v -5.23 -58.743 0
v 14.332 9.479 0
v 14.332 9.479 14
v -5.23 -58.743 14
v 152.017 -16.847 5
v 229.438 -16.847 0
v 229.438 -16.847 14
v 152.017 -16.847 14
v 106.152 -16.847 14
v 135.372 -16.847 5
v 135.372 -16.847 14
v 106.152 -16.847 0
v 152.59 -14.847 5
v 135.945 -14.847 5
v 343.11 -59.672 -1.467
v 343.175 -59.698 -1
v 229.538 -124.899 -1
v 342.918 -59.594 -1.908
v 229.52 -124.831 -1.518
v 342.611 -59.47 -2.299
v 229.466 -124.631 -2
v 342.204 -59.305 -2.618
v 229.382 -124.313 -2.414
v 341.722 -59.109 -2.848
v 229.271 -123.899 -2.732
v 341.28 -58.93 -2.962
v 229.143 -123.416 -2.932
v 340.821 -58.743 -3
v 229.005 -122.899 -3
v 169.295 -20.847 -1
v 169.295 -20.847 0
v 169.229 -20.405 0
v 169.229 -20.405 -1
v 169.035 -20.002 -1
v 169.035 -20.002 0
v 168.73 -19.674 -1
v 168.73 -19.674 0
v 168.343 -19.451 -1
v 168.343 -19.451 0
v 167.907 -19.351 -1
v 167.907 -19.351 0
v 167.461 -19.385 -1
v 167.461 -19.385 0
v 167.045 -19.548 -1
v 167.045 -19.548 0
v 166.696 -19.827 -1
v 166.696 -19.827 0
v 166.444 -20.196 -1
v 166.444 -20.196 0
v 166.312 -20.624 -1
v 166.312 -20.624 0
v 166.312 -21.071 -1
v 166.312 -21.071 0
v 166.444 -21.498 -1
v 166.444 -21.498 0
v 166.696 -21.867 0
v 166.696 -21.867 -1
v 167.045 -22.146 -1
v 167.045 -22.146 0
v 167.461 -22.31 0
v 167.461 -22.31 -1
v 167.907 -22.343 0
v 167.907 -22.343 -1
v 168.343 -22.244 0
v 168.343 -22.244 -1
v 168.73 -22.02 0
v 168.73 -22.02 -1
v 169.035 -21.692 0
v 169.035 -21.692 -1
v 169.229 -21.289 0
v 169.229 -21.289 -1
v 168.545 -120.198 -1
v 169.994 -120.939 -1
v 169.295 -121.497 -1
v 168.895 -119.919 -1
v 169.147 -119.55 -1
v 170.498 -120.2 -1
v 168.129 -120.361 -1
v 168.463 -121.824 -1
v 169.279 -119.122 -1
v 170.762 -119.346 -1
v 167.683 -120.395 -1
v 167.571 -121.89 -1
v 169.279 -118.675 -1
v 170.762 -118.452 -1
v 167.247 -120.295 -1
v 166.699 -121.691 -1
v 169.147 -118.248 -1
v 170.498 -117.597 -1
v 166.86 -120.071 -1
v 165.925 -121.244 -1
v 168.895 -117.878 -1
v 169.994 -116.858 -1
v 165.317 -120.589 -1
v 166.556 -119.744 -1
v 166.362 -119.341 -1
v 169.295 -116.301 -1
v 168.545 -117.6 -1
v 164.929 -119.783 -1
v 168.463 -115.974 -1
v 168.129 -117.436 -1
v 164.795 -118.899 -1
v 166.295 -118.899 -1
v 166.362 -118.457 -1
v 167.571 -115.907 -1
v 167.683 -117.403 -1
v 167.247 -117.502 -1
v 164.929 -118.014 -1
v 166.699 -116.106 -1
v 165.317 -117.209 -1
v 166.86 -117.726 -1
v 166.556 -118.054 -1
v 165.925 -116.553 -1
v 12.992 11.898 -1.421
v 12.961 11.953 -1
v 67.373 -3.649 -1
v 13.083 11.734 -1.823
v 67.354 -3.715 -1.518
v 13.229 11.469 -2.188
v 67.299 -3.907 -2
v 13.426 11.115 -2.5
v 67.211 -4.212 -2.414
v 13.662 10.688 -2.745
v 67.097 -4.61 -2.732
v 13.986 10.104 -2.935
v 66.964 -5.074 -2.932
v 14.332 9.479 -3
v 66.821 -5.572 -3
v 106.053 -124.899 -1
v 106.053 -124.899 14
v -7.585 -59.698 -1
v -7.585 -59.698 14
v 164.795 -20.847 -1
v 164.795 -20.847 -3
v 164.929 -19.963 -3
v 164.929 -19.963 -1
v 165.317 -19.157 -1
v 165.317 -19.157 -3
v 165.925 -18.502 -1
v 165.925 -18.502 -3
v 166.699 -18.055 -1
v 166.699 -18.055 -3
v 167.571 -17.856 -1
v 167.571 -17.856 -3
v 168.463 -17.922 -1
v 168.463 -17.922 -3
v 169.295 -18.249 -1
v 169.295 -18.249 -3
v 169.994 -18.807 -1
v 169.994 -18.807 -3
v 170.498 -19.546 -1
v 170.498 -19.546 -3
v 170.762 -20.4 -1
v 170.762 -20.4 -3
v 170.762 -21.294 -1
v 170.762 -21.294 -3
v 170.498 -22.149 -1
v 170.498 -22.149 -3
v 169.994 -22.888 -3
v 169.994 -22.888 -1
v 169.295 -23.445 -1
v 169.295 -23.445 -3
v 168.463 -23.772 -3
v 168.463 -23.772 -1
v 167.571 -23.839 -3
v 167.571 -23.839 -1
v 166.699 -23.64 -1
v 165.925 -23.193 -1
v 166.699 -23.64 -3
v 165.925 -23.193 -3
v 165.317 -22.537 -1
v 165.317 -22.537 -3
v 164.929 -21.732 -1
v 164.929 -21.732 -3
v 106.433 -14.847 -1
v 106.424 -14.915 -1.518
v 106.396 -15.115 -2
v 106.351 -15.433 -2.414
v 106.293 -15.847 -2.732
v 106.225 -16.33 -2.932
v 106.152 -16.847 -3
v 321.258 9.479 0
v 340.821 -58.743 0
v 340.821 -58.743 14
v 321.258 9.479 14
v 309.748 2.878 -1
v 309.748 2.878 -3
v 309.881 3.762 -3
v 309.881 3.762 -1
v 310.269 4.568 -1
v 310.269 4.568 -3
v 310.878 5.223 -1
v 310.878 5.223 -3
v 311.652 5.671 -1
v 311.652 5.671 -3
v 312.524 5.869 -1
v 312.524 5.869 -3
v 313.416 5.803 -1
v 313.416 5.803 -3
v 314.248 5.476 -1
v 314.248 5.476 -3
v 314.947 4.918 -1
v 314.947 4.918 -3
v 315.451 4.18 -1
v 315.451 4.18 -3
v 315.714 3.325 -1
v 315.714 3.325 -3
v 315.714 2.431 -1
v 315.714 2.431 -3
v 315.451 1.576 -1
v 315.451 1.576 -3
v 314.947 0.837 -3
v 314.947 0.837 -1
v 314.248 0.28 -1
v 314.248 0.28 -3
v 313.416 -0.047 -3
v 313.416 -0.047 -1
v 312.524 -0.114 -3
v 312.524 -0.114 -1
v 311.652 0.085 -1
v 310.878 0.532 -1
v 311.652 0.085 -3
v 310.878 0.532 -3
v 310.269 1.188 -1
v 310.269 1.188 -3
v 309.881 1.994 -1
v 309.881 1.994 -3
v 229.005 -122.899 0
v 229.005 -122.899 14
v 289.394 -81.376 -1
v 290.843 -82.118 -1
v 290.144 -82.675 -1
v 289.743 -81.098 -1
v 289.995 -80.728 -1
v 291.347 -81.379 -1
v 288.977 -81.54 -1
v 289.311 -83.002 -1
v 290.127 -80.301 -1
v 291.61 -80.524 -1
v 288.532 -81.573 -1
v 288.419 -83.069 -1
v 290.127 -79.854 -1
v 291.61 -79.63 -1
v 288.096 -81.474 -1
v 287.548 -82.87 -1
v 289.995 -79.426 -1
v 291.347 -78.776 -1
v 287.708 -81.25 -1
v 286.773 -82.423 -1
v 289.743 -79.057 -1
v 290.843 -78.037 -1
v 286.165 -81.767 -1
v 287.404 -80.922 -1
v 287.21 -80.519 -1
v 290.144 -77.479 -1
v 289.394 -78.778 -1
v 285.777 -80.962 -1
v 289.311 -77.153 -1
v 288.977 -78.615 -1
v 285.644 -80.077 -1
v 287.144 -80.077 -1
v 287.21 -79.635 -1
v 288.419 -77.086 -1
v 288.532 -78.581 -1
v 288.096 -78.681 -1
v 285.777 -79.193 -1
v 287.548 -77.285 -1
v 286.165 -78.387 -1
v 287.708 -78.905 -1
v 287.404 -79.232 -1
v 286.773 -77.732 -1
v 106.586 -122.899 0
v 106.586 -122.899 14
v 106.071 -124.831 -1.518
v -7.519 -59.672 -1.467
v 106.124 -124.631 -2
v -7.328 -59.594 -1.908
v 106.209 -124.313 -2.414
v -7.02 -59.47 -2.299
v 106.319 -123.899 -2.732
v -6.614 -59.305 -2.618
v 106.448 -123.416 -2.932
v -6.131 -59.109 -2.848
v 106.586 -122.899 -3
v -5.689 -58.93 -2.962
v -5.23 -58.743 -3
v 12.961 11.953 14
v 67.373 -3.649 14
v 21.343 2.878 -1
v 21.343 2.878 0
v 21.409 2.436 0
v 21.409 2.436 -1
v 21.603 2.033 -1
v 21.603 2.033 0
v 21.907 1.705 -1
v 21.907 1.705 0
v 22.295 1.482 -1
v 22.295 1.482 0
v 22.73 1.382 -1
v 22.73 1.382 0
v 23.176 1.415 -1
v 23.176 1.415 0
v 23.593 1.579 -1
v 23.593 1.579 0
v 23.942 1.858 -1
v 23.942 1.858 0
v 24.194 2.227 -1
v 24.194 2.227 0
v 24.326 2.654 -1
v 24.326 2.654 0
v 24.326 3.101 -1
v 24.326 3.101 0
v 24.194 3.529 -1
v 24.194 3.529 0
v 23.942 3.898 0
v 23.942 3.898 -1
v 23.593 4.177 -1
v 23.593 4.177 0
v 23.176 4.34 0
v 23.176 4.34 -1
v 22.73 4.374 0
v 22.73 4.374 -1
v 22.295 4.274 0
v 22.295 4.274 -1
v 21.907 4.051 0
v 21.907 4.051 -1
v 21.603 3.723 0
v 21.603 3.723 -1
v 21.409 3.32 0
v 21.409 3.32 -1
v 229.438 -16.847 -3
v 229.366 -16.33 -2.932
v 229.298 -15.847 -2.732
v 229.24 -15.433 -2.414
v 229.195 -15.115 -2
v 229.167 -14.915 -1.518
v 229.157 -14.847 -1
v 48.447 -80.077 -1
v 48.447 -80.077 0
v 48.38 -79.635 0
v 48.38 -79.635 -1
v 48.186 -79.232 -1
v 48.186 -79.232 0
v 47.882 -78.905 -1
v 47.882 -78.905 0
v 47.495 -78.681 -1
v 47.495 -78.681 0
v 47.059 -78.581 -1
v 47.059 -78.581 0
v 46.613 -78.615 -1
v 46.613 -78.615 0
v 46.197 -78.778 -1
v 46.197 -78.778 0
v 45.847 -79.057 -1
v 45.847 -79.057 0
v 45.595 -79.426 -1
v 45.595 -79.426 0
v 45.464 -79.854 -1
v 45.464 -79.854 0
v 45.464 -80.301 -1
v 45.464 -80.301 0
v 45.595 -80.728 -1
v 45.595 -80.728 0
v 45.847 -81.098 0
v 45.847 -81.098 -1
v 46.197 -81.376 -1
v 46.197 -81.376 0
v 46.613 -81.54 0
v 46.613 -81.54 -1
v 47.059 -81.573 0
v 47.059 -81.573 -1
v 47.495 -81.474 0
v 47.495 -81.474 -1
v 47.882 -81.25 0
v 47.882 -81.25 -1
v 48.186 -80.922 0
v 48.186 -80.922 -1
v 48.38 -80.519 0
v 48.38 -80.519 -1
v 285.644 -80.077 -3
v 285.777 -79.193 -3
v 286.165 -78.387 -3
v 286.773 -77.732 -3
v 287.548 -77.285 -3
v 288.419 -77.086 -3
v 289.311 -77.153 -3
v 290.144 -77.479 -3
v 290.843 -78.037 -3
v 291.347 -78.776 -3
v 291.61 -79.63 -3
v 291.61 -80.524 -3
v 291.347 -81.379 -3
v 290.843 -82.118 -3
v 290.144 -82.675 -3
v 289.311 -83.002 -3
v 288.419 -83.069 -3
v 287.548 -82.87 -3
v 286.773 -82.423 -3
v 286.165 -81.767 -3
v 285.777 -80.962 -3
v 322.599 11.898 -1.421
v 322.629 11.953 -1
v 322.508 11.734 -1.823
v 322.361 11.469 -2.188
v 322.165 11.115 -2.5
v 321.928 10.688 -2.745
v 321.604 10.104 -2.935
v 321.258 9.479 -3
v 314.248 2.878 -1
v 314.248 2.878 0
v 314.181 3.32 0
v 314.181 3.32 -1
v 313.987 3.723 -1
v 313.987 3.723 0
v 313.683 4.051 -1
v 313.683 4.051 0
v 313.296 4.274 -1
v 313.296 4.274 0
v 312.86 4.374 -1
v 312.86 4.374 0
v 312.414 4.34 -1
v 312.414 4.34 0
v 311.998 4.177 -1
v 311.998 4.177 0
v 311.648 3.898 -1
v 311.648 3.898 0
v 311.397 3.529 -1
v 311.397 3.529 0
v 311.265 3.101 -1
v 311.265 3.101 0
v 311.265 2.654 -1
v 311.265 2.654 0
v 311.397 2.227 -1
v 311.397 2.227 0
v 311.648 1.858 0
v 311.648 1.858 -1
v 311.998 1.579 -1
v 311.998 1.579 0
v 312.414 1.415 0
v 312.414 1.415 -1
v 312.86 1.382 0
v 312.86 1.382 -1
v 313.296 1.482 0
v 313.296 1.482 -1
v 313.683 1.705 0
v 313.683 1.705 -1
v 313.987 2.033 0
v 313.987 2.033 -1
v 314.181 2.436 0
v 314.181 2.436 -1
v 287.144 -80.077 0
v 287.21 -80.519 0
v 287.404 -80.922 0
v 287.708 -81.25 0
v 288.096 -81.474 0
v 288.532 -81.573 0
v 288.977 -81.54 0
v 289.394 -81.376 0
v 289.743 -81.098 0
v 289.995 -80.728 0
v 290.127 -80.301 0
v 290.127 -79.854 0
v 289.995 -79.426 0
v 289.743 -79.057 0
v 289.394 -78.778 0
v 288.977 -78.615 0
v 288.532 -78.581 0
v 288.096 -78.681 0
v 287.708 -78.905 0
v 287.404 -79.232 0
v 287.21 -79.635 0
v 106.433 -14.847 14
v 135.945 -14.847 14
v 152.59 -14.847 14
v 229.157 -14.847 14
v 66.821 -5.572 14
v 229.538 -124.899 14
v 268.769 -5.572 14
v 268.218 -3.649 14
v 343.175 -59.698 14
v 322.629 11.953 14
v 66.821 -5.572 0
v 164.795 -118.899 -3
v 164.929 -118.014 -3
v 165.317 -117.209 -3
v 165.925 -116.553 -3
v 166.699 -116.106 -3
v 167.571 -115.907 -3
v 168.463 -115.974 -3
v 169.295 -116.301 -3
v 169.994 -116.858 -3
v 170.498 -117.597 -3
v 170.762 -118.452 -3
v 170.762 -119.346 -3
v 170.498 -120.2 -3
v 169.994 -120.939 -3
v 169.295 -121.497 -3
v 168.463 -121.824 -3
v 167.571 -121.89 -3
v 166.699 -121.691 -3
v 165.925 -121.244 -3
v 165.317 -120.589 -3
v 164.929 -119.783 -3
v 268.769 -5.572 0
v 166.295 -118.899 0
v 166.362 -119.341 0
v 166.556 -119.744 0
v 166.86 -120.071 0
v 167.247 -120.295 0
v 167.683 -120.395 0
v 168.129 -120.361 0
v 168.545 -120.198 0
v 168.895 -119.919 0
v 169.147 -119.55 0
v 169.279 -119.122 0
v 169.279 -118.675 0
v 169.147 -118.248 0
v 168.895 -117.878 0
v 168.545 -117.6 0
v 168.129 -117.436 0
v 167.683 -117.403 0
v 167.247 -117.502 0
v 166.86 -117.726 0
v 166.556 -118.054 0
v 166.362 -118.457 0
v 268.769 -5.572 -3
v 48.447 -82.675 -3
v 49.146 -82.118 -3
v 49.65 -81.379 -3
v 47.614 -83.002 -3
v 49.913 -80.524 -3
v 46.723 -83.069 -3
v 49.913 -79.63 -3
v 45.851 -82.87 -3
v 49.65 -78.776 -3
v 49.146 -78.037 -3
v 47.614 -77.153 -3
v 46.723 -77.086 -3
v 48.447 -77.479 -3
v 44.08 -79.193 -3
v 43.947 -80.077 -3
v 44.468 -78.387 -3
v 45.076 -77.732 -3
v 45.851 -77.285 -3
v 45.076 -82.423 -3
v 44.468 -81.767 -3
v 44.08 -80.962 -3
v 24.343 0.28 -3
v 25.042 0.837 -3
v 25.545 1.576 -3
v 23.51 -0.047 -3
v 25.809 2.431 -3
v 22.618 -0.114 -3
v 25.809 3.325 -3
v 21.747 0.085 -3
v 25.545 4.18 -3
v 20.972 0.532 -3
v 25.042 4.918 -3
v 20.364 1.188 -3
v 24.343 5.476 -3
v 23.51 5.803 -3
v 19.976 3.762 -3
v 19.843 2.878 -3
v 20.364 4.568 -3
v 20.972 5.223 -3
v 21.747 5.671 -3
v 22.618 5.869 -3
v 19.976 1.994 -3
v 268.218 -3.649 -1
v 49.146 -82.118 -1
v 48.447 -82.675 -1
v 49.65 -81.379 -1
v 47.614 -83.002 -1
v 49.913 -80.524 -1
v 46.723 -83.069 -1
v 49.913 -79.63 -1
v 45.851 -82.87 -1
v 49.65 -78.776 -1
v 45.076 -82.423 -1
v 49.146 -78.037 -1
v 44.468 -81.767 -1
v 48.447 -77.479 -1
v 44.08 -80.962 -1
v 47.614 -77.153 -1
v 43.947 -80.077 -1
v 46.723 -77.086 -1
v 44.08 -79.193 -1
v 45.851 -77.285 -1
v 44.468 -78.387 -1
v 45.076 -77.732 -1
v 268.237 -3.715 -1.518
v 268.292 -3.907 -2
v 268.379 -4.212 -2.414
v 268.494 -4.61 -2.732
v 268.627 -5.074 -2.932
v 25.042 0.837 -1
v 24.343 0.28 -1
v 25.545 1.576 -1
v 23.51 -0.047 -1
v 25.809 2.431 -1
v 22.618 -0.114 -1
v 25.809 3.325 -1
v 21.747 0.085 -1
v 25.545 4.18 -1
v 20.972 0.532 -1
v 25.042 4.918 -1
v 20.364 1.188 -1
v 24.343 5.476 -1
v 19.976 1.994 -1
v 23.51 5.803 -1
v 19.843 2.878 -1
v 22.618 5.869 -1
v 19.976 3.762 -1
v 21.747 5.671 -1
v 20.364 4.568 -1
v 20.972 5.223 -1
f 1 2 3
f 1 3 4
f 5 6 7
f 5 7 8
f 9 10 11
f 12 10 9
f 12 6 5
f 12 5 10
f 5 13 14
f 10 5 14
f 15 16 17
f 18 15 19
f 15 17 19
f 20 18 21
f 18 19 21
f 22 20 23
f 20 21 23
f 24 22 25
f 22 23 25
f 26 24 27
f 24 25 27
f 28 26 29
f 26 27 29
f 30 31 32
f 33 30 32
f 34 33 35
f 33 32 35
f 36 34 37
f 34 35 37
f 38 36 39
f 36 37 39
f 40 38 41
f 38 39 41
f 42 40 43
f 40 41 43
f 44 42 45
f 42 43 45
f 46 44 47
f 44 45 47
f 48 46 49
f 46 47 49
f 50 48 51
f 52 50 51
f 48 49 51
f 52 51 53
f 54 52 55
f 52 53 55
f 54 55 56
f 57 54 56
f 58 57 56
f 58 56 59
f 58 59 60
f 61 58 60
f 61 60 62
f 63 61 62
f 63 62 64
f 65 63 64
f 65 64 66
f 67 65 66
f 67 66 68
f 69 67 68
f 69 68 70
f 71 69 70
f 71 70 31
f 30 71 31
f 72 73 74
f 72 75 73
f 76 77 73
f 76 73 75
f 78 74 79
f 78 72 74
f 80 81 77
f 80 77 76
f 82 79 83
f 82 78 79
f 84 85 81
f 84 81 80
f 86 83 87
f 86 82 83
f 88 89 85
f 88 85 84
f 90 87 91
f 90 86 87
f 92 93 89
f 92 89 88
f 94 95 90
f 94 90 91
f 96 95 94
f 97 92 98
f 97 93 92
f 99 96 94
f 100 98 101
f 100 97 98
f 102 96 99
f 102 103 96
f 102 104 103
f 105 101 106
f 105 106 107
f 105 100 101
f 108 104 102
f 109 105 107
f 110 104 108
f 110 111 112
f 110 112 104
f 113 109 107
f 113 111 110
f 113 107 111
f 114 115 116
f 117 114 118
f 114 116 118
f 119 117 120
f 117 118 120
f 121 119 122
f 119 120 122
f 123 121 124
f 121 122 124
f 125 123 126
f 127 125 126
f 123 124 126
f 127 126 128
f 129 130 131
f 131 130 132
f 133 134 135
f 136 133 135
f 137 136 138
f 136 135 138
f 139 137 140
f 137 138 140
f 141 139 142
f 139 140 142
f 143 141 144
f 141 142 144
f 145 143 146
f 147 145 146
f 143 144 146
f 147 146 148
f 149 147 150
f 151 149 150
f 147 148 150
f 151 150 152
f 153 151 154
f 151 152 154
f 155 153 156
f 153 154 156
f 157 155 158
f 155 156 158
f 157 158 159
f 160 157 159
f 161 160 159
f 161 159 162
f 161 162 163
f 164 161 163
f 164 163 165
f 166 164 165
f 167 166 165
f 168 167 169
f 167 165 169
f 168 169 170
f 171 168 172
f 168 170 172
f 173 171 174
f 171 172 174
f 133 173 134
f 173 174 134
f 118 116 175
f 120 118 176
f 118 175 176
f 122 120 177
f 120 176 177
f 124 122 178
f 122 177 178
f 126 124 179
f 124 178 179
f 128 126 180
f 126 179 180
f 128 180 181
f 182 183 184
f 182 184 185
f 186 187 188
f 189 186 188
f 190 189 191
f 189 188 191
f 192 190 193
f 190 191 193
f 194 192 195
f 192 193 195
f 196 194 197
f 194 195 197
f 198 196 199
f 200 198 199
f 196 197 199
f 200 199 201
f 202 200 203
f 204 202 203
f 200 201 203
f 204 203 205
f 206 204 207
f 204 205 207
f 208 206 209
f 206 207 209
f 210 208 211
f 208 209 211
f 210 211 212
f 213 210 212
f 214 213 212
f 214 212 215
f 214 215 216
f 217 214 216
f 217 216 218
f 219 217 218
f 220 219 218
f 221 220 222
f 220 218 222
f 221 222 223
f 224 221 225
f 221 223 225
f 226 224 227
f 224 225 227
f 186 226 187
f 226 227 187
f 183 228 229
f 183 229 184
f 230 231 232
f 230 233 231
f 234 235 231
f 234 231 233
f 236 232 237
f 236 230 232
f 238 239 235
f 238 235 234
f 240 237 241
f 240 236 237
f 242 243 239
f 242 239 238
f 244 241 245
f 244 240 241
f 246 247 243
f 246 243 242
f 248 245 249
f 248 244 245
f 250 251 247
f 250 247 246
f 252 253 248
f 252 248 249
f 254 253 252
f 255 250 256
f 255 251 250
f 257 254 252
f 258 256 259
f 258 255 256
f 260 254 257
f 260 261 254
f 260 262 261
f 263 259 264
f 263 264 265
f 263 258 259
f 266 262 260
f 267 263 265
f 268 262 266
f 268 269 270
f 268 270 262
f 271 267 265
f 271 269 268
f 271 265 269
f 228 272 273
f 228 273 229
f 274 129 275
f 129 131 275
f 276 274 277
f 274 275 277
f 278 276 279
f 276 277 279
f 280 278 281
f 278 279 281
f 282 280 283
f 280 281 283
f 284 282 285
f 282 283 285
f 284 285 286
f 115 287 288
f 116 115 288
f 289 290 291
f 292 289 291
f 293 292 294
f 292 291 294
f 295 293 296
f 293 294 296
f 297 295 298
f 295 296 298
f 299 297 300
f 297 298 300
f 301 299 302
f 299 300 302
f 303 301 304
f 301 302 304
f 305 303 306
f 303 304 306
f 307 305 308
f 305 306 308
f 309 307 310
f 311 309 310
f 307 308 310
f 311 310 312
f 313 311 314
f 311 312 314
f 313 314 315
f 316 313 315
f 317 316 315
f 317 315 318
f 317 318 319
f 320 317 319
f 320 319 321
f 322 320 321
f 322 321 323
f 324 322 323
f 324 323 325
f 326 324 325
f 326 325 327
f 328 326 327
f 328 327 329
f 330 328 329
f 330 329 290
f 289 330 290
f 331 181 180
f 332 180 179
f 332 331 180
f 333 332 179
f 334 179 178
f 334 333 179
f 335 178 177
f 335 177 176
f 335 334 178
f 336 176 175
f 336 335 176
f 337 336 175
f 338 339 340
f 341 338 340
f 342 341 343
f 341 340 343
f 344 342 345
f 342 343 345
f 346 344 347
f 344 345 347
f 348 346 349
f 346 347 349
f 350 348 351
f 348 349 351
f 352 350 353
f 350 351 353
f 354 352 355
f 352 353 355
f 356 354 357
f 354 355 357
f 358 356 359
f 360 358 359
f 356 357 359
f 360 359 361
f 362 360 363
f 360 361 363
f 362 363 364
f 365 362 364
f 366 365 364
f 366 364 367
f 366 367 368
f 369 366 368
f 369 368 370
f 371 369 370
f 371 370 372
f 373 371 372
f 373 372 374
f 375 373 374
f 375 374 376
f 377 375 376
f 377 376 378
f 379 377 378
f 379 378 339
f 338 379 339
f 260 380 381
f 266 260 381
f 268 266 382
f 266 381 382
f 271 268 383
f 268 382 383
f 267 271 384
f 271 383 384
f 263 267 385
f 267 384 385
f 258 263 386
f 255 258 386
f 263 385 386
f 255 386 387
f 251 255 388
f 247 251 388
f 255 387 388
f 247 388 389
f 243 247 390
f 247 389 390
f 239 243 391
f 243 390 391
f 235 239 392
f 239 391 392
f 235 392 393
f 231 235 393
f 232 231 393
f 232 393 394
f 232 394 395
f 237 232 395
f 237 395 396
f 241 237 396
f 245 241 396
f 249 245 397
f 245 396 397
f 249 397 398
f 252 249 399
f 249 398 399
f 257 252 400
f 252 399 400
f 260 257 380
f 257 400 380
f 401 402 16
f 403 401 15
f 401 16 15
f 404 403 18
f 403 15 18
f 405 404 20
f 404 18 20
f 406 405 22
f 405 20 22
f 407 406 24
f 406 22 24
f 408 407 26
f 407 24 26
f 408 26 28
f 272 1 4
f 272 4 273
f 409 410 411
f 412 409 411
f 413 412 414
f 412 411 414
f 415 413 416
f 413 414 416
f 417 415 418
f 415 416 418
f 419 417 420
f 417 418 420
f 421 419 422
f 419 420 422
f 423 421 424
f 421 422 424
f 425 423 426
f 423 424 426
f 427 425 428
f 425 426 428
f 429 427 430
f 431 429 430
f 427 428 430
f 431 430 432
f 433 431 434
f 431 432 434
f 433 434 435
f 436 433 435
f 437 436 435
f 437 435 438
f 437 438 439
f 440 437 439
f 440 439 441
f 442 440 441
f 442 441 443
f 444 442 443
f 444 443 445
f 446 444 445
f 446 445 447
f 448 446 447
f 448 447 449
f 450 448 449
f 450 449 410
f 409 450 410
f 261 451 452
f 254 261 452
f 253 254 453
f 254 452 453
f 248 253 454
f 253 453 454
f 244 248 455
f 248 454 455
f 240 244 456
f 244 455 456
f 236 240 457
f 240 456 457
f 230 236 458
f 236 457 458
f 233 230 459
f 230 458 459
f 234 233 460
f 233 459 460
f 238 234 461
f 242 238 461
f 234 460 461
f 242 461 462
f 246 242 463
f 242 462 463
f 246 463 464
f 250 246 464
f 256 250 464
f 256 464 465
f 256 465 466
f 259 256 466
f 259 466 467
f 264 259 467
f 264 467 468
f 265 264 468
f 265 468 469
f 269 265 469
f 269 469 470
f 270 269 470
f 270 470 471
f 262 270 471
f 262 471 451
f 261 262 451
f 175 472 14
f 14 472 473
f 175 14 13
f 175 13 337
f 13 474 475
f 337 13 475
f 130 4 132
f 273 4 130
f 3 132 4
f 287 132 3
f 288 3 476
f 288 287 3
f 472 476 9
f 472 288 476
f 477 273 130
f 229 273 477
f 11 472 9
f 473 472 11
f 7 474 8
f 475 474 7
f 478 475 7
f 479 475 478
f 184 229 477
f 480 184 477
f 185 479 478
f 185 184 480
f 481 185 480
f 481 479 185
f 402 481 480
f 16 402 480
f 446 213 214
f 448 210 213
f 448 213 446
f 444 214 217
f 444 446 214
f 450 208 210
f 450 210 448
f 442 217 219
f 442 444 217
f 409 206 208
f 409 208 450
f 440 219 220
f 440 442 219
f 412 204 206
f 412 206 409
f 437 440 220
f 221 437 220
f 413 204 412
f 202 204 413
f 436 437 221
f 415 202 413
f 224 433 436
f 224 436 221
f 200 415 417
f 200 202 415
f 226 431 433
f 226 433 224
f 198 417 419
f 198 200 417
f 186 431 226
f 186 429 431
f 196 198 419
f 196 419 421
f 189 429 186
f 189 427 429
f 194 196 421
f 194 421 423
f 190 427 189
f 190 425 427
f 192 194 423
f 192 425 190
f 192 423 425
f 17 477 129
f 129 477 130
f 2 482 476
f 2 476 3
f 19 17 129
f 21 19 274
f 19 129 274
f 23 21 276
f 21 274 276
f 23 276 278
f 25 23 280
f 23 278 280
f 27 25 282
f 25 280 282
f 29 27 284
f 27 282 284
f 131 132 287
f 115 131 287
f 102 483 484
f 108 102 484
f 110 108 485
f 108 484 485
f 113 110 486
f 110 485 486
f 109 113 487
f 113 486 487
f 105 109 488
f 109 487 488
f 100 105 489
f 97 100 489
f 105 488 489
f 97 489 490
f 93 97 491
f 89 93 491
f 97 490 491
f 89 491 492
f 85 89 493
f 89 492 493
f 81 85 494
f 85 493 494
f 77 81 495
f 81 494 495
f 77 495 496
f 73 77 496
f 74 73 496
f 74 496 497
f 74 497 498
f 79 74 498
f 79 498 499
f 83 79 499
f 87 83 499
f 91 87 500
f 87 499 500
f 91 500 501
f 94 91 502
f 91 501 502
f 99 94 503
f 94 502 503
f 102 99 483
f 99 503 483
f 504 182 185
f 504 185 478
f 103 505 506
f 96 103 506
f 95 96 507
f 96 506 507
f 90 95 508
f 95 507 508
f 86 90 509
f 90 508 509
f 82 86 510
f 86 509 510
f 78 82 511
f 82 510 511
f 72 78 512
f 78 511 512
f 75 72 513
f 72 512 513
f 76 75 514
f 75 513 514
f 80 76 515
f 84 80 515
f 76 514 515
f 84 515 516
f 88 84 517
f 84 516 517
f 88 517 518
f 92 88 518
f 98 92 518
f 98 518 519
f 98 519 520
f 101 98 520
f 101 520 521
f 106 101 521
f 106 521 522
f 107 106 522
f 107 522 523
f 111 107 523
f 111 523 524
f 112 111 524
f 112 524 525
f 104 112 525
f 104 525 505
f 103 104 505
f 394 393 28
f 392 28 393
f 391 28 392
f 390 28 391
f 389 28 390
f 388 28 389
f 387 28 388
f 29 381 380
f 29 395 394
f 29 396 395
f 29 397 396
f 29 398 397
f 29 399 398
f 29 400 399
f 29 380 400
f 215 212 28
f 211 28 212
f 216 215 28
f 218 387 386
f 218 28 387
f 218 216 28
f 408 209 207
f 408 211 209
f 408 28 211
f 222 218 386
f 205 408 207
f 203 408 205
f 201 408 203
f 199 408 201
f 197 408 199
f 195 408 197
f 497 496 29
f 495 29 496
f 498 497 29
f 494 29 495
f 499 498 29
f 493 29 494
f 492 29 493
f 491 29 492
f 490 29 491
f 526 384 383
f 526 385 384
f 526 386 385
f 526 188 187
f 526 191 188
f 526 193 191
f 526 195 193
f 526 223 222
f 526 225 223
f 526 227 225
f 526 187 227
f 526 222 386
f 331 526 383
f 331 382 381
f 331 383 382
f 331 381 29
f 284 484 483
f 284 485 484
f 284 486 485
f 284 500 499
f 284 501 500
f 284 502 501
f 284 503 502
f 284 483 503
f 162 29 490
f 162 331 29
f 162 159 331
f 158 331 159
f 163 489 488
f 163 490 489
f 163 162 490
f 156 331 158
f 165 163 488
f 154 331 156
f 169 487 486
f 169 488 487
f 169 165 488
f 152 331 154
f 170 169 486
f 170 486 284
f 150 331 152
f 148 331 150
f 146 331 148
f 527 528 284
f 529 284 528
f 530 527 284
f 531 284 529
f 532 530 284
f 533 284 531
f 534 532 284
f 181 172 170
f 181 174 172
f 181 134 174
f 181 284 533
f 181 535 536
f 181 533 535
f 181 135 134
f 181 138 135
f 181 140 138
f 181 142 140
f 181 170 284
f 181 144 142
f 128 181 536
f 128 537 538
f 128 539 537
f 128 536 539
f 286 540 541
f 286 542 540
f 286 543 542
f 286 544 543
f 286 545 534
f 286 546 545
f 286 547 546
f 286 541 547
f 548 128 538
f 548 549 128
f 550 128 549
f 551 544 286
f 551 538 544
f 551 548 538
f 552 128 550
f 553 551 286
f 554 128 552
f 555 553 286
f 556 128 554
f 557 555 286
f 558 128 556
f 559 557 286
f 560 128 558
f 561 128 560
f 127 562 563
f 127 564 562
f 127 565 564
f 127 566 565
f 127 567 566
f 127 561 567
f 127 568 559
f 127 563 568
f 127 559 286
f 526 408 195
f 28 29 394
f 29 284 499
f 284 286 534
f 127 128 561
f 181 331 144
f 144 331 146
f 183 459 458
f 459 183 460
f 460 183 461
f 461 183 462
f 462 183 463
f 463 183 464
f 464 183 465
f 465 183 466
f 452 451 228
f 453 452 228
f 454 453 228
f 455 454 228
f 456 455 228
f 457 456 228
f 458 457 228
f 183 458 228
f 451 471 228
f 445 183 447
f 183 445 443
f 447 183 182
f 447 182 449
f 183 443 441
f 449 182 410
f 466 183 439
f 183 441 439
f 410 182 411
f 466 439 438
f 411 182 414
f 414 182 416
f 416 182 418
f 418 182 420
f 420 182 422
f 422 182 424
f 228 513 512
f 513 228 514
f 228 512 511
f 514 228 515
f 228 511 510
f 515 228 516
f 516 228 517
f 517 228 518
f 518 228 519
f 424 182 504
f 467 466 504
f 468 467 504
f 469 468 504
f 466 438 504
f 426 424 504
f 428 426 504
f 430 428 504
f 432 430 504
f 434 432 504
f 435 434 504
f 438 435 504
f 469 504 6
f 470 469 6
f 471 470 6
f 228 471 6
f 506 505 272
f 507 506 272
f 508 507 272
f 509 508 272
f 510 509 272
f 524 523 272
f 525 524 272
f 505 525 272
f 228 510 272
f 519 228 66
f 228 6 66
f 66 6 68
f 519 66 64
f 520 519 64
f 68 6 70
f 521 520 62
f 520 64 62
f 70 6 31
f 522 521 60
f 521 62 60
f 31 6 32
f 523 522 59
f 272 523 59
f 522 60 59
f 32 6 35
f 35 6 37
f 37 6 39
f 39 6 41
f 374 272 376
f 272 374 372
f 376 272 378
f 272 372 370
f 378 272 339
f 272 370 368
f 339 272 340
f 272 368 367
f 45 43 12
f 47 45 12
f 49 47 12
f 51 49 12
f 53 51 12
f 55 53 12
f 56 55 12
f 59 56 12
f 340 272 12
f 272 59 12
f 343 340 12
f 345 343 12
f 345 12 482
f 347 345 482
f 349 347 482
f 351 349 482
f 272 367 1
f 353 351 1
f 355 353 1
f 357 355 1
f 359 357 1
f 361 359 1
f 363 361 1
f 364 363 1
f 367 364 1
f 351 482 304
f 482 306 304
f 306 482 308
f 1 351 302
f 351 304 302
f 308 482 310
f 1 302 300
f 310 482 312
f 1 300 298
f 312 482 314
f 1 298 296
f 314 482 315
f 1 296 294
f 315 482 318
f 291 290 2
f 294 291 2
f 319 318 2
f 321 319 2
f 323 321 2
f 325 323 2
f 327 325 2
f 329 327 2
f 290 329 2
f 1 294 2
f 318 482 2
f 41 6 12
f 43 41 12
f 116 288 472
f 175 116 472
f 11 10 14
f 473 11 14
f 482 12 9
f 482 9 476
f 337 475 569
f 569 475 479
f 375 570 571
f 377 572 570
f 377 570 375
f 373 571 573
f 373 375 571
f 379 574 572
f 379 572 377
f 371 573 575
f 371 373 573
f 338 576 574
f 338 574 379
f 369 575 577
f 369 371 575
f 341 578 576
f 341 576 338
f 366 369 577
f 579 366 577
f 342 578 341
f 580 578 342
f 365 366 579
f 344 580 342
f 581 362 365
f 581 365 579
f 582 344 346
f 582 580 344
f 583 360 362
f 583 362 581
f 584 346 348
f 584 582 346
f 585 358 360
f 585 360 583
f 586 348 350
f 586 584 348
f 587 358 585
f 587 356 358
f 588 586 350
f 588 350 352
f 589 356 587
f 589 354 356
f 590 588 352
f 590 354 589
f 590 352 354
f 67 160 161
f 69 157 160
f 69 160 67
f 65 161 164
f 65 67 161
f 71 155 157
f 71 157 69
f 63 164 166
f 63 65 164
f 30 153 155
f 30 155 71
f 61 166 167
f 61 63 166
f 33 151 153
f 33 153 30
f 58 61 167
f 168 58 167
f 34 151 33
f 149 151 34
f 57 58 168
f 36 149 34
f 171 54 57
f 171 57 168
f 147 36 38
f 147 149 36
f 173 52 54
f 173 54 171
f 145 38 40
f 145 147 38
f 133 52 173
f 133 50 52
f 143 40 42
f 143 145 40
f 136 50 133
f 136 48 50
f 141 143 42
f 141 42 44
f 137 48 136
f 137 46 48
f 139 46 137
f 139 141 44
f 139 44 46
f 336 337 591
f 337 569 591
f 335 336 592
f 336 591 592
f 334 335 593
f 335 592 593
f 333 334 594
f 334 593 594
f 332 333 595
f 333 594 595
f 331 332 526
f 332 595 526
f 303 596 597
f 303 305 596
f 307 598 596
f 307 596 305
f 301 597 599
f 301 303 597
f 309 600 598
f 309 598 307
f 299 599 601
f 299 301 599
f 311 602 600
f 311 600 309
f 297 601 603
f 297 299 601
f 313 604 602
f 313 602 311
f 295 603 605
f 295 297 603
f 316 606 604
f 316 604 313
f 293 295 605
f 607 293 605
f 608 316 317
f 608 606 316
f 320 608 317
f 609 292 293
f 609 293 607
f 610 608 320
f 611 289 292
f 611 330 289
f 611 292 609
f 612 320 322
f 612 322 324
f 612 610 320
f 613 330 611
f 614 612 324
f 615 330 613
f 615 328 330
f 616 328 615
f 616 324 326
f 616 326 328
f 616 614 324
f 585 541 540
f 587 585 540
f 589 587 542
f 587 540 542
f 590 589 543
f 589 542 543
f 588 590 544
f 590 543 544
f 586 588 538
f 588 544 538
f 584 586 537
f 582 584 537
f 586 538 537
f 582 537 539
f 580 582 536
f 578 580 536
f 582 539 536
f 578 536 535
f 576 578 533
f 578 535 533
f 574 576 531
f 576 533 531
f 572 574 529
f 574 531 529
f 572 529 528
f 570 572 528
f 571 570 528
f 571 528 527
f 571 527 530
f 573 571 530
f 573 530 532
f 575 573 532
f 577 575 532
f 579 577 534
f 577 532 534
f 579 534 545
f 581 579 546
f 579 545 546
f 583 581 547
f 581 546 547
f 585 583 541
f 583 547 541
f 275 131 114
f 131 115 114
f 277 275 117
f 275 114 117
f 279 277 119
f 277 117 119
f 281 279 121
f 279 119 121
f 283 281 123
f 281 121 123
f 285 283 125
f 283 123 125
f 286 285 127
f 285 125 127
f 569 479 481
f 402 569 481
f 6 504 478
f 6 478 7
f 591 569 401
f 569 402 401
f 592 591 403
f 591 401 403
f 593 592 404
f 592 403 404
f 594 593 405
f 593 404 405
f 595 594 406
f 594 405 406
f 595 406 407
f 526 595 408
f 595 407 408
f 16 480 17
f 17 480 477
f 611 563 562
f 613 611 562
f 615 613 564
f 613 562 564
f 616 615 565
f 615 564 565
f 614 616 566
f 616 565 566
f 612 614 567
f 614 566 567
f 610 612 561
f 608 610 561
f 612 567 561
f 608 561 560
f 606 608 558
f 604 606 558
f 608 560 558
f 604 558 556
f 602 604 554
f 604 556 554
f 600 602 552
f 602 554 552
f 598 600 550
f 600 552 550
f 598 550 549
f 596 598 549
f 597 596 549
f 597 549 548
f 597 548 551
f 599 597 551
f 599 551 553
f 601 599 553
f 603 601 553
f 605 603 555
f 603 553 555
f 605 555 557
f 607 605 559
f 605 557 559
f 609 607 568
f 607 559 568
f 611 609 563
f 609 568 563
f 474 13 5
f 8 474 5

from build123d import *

# Parameters (mm, degrees)
BOSS_EXTRU_1_DEPTH      = 14
BOSS_EXTRU_2_DEPTH      = 3
CONG_1_R                = 2
ENL_V_START             = 5
ENL_V_MAT_EXTRU_1_DEPTH = 10
ESQUISSE7_R             = 1.5
ENL_V_MAT_EXTRU_2_DEPTH = 10
ESQUISSE8_R             = 3
ENL_V_MAT_EXTRU_3_DEPTH = 2


with BuildPart() as part:
    # Esquisse1 → Boss.-Extru.1 (new body)
    with BuildSketch(Plane.XY):
        Polygon((229.15721289, -14.84723942), (106.433306853, -14.84723942), (67.372523259, -3.649091023), (12.961214213, 11.953100779), (-7.58450021, -59.698320459), (106.05278448, -124.898736851), (229.537735263, -124.898736851), (343.175019953, -59.698320459), (322.62930553, 11.953100779), (268.217996484, -3.649091023), align=None)
        Polygon((229.438237844, -16.84723942), (106.152281899, -16.84723942), (66.821302011, -5.571629745), (14.332462893, 9.479302675), (-5.230075099, -58.743374877), (106.585792597, -122.898736851), (229.004727146, -122.898736851), (340.820594842, -58.743374877), (321.25805685, 9.479302675), (268.769217732, -5.571629745), align=None, mode=Mode.SUBTRACT)
    extrude(amount=BOSS_EXTRU_1_DEPTH)

    # Esquisse2 → Boss.-Extru.2 (add)
    with BuildSketch(Plane(origin=(0, 0, 0), x_dir=(-1, 0, 0), z_dir=(0, 0, -1))):
        Polygon((-229.15721289, -14.84723942), (-268.217996484, -3.649091023), (-322.62930553, 11.953100779), (-343.175019953, -59.698320459), (-229.537735263, -124.898736851), (-106.05278448, -124.898736851), (7.58450021, -59.698320459), (-12.961214213, 11.953100779), (-67.372523259, -3.649091023), (-106.433306853, -14.84723942), align=None)
    extrude(amount=BOSS_EXTRU_2_DEPTH)

    # Congé1
    cong_1_edges = [part.edges().sort_by_distance(p)[0] for p in [
        (167.795259872, -14.84723942, -3),
        (248.687604687, -9.248165222, -3),
        (295.423651007, 4.152004878, -3),
        (332.902162742, -23.87260984, -3),
        (286.356377608, -92.298528655, -3),
        (167.795259872, -124.898736851, -3),
        (49.234142135, -92.298528655, -3),
        (2.688357001, -23.87260984, -3),
        (40.166868736, 4.152004878, -3),
        (86.902915056, -9.248165222, -3),
    ]]
    fillet(cong_1_edges, radius=CONG_1_R)

    # Esquisse3 → Enlèv. mat.-Extru.1 (cut)
    with BuildSketch(Plane.XY.offset(ENL_V_START)):
        Polygon((142.206494045, 6.988548589), (157.586708491, 2.578446141), (132.665816954, -84.333062282), (117.285602508, -79.922959834), align=None)
    extrude(amount=ENL_V_MAT_EXTRU_1_DEPTH, mode=Mode.SUBTRACT)

    # Esquisse7 → Enlèv. mat.-Extru.2 (cut)
    with BuildSketch(Plane.XY):
        with Locations((312.747989314, 2.877882334)):
            Circle(ESQUISSE7_R)
        with Locations((167.795259872, -20.84723942)):
            Circle(ESQUISSE7_R)
        with Locations(Location((22.842530429, 2.877882334, 0), (0, 0, 180))):
            Circle(ESQUISSE7_R)
        with Locations(Location((167.795259872, -118.898736851, 0), (0, 0, 180))):
            Circle(ESQUISSE7_R)
        with Locations((46.946880967, -80.077290604)):
            Circle(ESQUISSE7_R)
        with Locations(Location((288.643638776, -80.077290604, 0), (0, 0, 180))):
            Circle(ESQUISSE7_R)
    extrude(amount=-ENL_V_MAT_EXTRU_2_DEPTH, mode=Mode.SUBTRACT)

    # Esquisse8 → Enlèv. mat.-Extru.3 (cut)
    with BuildSketch(Plane(origin=(0, 0, -3), x_dir=(-1, 0, 0), z_dir=(0, 0, -1))):
        with Locations((-22.842530429, 2.877882334)):
            Circle(ESQUISSE8_R)
        with Locations((-46.946880967, -80.077290604)):
            Circle(ESQUISSE8_R)
        with Locations((-167.795259872, -118.898736851)):
            Circle(ESQUISSE8_R)
        with Locations((-167.795259872, -20.84723942)):
            Circle(ESQUISSE8_R)
        with Locations((-288.643638776, -80.077290604)):
            Circle(ESQUISSE8_R)
        with Locations((-312.747989314, 2.877882334)):
            Circle(ESQUISSE8_R)
    extrude(amount=-ENL_V_MAT_EXTRU_3_DEPTH, mode=Mode.SUBTRACT)


solid = part.part
